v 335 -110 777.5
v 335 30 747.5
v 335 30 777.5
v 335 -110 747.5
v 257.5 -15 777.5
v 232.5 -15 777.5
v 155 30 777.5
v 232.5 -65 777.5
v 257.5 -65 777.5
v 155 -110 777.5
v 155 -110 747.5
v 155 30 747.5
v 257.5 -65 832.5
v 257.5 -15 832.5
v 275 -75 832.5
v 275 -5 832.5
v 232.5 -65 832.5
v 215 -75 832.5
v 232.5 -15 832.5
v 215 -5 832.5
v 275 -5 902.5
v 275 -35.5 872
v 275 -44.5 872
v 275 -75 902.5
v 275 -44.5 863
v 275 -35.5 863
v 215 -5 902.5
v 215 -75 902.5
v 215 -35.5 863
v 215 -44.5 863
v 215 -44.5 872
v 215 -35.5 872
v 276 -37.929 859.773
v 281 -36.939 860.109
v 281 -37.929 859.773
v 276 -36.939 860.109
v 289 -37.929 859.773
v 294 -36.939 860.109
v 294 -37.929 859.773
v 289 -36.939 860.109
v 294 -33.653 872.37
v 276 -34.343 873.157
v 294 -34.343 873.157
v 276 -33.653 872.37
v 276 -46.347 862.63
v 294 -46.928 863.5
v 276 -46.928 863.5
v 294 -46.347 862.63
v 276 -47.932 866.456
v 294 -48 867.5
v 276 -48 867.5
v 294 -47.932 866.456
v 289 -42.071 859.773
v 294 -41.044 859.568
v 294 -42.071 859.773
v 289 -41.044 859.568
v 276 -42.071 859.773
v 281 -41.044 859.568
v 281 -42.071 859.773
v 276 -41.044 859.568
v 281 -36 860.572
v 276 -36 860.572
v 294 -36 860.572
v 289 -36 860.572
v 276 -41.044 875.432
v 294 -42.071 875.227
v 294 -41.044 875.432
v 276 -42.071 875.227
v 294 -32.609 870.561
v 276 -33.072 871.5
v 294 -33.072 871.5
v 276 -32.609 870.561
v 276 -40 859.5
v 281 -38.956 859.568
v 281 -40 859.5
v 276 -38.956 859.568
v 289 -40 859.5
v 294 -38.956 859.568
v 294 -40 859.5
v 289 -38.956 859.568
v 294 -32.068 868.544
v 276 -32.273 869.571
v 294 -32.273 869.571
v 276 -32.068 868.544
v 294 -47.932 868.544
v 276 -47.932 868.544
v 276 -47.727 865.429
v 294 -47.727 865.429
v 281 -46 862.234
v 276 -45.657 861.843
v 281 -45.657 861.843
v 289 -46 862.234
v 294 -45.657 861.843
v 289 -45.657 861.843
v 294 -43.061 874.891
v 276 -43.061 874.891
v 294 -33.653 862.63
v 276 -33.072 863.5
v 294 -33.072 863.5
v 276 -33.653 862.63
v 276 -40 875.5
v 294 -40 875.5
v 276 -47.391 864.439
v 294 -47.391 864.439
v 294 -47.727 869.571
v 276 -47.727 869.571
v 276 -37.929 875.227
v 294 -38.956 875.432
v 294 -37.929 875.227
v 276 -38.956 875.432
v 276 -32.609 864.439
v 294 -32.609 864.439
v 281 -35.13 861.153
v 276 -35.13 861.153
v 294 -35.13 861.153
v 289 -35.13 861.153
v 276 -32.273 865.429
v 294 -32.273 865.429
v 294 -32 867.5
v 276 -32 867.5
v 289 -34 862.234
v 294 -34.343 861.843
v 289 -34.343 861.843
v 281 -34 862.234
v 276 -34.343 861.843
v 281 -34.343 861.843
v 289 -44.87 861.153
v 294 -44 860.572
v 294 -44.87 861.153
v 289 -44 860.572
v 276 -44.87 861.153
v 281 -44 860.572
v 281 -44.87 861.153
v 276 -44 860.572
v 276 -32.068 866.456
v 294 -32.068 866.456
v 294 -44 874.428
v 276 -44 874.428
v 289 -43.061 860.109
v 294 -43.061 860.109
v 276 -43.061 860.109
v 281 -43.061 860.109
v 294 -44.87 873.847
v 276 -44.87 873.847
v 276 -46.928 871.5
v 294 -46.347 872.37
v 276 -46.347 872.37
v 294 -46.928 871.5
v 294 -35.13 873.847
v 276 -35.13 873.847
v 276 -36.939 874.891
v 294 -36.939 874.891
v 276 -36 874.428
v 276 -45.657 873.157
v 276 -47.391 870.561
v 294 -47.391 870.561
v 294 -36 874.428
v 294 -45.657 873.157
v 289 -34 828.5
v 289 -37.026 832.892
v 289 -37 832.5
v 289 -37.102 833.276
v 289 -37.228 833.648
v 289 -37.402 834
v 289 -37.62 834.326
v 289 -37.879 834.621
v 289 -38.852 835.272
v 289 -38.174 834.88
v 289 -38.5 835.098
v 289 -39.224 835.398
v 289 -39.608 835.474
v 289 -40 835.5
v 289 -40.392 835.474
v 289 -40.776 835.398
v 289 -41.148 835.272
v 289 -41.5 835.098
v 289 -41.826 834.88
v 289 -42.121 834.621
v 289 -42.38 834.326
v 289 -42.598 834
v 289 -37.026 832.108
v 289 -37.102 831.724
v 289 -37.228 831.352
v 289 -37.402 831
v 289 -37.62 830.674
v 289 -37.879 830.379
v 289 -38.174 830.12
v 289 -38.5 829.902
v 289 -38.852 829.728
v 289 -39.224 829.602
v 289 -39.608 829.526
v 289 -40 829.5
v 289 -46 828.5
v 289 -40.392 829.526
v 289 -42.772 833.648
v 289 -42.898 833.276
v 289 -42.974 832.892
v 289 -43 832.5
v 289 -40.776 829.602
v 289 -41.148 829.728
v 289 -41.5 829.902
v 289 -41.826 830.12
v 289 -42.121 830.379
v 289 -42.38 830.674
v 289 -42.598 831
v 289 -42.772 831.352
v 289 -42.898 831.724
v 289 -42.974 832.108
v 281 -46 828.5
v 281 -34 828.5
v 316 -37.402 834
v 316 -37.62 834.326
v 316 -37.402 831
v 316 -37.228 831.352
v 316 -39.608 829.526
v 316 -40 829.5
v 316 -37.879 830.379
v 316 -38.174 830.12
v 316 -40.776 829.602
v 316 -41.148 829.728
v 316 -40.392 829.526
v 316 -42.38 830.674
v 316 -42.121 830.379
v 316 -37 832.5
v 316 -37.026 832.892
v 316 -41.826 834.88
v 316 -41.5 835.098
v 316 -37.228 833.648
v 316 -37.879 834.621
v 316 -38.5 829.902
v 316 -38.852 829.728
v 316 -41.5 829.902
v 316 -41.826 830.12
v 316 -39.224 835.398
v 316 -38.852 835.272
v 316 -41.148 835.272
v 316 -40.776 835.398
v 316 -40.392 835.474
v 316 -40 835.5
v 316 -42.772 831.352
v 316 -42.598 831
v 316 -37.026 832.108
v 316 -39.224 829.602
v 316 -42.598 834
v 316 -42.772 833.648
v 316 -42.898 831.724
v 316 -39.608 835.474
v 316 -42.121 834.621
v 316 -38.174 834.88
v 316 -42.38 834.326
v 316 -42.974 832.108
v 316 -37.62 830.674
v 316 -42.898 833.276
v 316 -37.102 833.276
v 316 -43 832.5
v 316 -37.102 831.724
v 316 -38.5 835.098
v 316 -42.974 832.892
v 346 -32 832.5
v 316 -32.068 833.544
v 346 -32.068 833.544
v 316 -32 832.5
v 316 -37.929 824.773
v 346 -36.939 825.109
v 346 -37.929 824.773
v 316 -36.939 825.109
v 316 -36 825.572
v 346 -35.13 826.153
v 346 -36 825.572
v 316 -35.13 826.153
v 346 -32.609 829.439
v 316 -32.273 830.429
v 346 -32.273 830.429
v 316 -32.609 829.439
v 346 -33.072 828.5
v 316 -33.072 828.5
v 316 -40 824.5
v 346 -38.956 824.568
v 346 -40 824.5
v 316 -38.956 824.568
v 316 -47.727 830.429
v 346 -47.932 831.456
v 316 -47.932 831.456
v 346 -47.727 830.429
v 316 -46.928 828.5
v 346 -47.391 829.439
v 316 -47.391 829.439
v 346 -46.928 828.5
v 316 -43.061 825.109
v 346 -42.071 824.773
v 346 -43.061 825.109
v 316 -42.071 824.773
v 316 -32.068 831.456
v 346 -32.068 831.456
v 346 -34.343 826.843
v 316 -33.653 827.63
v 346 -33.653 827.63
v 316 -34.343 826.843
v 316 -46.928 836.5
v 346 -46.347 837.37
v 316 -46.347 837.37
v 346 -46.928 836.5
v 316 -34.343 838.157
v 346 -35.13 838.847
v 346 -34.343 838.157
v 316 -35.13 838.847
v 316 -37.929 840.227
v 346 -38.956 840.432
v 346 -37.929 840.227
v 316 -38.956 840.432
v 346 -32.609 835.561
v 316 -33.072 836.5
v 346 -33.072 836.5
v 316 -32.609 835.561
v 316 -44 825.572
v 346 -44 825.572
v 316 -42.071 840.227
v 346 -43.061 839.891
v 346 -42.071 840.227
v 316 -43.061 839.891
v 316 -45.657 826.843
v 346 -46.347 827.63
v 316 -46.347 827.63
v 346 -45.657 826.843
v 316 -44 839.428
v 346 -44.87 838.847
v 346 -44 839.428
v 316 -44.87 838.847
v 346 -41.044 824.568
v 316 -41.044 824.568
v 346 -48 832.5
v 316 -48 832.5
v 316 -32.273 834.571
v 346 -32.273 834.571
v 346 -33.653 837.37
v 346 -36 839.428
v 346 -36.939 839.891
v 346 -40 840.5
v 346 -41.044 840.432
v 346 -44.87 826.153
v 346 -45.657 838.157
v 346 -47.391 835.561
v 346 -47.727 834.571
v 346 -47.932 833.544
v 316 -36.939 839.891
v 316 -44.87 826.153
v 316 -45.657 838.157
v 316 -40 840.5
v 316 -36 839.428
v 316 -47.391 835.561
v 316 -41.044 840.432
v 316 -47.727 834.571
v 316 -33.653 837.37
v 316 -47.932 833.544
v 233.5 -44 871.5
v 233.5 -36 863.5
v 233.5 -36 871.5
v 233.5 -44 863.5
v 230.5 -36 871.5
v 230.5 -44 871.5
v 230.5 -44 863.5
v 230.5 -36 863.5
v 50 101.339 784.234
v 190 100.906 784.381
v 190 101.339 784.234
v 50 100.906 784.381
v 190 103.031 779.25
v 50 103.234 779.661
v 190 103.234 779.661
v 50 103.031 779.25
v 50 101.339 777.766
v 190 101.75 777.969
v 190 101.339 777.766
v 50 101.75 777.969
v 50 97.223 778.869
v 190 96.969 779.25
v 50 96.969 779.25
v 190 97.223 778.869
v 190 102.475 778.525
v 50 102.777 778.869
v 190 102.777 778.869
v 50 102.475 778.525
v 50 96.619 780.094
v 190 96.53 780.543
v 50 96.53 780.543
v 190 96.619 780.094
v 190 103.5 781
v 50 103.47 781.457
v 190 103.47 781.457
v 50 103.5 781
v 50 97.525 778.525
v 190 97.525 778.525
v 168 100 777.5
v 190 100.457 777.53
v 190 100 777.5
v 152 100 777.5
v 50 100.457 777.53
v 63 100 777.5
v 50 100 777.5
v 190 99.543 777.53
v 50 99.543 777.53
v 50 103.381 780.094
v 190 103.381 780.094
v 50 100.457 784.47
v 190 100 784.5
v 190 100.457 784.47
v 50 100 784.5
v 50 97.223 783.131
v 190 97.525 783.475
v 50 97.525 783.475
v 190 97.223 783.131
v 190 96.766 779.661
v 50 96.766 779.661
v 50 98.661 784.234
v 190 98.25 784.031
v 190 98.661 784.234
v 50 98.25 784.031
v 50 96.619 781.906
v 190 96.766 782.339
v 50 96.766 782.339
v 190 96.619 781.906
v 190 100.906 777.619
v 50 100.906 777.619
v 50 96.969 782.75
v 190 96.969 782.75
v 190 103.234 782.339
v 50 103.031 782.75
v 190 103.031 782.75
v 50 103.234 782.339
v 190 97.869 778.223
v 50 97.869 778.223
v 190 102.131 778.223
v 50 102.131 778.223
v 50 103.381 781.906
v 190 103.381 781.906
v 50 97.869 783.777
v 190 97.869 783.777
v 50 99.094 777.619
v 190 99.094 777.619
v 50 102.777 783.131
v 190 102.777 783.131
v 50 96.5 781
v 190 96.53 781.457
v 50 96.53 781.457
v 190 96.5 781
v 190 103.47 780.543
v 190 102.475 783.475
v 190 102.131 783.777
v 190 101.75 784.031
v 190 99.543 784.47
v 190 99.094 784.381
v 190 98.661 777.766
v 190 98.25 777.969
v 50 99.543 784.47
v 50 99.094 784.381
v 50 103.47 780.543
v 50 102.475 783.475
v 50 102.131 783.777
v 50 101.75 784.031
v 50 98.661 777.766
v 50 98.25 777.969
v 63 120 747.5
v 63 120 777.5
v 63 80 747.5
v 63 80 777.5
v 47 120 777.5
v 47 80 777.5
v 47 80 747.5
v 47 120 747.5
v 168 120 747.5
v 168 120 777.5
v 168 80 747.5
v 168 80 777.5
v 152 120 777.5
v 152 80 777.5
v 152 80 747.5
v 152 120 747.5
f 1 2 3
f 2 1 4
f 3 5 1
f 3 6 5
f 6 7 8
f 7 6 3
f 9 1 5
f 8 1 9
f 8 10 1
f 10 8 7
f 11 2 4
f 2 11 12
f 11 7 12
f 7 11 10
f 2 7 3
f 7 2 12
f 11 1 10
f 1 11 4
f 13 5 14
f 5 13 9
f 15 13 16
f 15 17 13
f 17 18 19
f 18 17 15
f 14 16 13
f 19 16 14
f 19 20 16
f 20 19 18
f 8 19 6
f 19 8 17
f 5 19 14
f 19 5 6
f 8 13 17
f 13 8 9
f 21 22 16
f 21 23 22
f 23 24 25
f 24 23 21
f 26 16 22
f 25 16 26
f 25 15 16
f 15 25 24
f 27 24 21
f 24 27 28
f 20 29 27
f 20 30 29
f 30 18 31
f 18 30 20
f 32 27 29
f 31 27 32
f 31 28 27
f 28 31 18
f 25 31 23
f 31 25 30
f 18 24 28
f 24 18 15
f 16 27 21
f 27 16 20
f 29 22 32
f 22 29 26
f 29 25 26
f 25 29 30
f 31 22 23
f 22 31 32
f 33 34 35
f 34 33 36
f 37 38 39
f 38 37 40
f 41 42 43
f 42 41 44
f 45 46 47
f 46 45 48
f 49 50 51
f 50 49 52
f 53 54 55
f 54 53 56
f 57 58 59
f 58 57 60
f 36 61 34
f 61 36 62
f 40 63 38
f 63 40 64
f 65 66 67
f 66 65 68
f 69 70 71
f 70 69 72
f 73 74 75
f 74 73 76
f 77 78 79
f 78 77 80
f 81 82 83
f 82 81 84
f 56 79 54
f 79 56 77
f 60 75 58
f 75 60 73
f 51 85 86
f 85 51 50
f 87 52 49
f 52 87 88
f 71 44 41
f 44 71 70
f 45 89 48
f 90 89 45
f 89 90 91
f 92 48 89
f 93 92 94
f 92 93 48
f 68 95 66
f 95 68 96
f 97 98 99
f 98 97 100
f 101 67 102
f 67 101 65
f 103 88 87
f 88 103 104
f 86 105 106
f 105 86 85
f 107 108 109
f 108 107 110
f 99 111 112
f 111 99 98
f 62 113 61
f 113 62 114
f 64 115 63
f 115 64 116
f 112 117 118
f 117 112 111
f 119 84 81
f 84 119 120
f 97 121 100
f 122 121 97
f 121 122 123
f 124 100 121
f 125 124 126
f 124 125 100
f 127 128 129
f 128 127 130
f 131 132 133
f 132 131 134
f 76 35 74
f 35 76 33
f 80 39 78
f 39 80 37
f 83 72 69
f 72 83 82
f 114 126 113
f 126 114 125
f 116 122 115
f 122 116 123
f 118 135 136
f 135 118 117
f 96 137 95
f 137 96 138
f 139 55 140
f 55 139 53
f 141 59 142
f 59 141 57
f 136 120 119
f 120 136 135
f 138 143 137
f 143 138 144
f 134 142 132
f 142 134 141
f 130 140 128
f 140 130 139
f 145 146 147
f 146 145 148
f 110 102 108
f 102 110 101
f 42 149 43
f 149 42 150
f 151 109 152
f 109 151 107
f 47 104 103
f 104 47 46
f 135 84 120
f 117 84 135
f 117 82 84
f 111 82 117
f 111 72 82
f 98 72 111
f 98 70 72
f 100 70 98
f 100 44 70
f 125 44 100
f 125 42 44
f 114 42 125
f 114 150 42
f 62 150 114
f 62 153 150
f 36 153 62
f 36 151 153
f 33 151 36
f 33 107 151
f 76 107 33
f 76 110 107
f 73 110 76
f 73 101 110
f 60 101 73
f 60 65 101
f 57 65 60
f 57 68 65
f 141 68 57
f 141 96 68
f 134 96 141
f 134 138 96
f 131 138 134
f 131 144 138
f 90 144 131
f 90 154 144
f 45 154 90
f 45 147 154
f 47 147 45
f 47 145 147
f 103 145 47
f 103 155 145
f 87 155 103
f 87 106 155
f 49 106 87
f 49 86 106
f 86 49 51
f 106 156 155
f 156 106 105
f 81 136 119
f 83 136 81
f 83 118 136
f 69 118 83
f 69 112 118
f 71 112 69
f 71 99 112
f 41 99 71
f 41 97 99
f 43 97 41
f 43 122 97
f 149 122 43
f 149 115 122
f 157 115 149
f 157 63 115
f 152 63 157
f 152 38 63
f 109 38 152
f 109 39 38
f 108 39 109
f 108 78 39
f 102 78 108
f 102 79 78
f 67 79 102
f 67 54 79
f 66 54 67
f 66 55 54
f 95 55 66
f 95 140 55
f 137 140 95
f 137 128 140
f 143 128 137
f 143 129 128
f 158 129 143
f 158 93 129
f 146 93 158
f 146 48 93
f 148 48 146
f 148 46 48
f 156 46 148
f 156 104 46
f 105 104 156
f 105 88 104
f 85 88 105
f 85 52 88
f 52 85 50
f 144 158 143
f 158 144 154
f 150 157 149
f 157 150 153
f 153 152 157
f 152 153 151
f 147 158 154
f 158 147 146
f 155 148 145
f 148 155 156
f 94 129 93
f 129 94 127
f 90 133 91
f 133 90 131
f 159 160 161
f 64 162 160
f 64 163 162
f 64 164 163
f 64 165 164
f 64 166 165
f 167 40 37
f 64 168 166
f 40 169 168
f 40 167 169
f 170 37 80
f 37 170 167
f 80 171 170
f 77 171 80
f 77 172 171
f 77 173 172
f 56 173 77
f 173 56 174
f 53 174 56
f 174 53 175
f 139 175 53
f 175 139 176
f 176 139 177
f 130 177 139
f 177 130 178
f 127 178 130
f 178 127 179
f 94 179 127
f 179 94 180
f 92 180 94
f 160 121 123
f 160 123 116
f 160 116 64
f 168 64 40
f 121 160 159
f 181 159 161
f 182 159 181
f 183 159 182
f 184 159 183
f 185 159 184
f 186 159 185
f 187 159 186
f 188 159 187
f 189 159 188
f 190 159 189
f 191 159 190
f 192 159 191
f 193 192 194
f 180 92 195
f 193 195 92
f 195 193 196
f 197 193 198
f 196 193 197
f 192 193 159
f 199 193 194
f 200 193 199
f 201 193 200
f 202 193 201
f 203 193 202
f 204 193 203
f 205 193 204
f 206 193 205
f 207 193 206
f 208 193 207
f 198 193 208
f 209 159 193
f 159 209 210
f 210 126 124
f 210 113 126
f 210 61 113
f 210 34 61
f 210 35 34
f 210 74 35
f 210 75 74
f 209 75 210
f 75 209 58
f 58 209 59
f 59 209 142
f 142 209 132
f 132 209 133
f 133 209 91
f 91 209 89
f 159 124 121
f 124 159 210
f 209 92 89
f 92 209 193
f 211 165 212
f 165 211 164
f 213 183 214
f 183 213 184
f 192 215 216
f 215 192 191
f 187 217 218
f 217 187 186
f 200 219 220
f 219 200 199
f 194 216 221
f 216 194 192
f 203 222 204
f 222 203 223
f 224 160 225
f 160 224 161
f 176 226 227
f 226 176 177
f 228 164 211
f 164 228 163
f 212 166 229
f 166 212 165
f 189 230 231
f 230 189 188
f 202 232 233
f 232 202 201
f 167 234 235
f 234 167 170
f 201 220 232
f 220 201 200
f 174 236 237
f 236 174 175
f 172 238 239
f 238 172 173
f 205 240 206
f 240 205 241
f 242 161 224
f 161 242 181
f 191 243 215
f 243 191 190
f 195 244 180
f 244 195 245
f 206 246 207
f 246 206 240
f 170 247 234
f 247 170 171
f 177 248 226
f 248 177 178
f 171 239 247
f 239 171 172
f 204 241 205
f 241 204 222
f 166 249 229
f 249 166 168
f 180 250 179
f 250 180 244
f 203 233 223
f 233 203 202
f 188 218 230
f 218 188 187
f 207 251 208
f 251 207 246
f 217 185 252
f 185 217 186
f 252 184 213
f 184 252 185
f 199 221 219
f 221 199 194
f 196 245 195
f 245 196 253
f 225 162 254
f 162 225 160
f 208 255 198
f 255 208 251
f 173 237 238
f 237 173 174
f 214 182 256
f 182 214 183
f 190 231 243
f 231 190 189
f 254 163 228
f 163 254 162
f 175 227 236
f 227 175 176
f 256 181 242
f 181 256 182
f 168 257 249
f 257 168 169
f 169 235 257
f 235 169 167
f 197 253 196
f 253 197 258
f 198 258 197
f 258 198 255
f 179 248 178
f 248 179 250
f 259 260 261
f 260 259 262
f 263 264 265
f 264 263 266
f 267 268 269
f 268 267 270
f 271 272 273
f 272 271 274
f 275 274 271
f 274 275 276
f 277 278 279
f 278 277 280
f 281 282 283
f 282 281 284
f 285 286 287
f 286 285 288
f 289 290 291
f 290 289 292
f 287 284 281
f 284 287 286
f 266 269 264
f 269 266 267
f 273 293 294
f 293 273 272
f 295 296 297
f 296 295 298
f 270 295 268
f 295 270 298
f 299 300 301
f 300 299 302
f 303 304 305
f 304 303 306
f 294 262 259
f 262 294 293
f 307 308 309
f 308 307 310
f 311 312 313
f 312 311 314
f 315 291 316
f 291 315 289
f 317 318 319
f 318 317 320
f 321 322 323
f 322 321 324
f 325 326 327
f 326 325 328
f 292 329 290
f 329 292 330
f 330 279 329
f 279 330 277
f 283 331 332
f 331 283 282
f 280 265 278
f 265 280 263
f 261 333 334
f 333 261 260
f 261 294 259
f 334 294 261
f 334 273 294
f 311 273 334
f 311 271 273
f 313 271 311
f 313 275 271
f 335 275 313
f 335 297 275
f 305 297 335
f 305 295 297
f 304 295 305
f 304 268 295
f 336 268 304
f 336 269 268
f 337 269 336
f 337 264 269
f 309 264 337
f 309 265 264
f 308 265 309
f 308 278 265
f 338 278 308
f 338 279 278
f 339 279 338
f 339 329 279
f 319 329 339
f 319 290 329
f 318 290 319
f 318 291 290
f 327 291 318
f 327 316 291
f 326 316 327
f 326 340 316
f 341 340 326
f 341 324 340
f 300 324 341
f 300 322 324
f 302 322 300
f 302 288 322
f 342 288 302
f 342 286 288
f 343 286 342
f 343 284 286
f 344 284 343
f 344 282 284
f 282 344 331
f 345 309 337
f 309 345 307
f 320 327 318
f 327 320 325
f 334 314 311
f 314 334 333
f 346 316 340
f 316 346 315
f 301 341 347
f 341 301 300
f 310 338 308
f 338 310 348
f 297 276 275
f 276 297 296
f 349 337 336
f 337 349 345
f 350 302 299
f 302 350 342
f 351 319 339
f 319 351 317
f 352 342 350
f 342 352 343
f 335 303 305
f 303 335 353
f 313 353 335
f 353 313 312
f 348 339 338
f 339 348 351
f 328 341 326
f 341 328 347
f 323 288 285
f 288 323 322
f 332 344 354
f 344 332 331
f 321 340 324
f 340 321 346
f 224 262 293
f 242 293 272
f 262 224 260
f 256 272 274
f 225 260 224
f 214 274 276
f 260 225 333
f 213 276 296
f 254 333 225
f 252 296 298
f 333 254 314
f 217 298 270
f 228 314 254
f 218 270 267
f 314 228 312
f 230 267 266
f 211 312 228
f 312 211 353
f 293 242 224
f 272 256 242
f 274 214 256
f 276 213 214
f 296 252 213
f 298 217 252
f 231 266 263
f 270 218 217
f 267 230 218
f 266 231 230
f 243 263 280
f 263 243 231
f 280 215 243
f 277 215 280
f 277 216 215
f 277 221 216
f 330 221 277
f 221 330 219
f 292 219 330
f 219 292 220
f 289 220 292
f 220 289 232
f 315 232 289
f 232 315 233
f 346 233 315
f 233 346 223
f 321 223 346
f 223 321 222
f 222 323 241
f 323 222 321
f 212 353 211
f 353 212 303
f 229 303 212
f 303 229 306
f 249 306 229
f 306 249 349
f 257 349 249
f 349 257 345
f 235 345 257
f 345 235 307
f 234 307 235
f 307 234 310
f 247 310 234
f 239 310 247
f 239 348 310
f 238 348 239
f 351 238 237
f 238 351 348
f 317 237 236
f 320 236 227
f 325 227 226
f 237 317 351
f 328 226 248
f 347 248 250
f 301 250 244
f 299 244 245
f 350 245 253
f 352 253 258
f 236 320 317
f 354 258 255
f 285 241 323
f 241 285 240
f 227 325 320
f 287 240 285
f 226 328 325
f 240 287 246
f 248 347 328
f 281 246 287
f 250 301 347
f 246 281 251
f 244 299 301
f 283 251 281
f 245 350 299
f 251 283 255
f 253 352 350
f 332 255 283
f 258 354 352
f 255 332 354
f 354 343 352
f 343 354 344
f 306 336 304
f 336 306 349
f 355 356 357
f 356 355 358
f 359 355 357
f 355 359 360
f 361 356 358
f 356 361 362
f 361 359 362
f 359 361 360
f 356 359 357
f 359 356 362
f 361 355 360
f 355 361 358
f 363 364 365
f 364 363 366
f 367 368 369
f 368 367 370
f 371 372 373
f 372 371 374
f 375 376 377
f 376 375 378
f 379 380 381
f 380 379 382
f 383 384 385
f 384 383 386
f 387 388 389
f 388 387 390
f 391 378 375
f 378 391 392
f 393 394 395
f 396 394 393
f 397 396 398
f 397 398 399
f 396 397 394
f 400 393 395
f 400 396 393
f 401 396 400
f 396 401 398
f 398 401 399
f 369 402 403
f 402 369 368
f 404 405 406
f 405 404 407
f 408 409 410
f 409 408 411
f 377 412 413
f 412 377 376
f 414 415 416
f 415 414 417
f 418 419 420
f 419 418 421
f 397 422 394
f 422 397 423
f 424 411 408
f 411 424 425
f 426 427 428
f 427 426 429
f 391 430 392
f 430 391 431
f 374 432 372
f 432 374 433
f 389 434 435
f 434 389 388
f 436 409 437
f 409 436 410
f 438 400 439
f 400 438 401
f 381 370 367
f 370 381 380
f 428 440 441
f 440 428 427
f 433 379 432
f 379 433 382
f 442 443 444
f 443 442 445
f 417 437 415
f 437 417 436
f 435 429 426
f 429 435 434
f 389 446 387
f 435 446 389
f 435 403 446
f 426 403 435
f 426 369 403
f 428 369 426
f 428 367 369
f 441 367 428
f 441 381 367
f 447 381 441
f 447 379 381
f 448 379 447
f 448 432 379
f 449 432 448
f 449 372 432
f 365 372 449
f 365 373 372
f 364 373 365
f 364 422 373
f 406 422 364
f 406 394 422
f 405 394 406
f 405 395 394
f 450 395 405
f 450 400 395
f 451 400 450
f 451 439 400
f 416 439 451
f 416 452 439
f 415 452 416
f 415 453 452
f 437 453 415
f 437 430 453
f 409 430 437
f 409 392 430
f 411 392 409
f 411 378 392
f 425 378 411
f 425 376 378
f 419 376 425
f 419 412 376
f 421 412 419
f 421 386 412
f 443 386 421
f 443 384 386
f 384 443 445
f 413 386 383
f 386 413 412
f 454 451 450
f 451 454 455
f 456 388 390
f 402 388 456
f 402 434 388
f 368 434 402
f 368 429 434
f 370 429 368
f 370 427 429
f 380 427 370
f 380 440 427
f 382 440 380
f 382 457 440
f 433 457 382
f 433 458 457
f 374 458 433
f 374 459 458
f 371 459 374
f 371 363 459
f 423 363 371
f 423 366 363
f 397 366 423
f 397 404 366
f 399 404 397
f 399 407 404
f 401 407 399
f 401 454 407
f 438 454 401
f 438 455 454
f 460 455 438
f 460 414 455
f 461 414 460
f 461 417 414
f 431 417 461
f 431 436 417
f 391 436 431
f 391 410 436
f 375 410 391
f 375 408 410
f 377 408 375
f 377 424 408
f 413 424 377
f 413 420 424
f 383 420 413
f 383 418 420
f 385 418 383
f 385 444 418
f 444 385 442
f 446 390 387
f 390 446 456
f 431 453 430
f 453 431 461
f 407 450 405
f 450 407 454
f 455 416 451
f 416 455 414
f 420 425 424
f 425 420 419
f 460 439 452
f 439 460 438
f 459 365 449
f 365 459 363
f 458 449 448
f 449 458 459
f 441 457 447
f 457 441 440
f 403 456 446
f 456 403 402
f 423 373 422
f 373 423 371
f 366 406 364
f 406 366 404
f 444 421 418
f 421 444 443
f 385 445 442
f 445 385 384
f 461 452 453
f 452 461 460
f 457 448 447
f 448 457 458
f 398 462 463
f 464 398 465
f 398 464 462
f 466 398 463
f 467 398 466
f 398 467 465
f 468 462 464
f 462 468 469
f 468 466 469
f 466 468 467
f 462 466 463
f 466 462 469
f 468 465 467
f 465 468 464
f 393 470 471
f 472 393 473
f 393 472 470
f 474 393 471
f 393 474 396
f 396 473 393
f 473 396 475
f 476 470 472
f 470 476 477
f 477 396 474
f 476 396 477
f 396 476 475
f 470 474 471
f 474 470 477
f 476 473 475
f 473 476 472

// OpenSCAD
// Millimetre geometric reference; use real functional tools, not printed heated or cutting equipment.
// Source SHA-256: 97d97832c856c9dcbde0cf4b1b9216d82a9513e5030d10fc58a440a32c2207de
$fn=48;
module stage(){
translate([0, 0, 0]) rotate([0, 0, 0]) cube([180, 140, 30],center=true);
translate([0, 0, 42.5]) rotate([0, 0, 0]) cube([25, 50, 55],center=true);
}
module tool(){
translate([0, -19.75, 0]) rotate([0, 0, 0]) cube([60, 30.5, 70],center=true);
translate([0, 19.75, 0]) rotate([0, 0, 0]) cube([60, 30.5, 70],center=true);
translate([0, 0, -19.75]) rotate([0, 0, 0]) cube([60, 9, 30.5],center=true);
translate([0, 0, 19.75]) rotate([0, 0, 0]) cube([60, 9, 30.5],center=true);
}
module wheel(){
translate([0, 0, 0]) rotate([0, 0, 0]) rotate([0,90,0]) cylinder(r=8,h=18,center=true);
translate([0, 0, -17.5]) rotate([0, 0, 0]) cube([8, 12, 43],center=true);
translate([20, 0, -35]) rotate([0, 0, 0]) rotate([0,90,0]) cylinder(r=3,h=40,center=true);
}
module knob(){
translate([0, 0, 0]) rotate([0, 0, 0]) rotate([0,90,0]) cylinder(r=8,h=30,center=true);
}
module cutter(){
translate([0, 0, 0]) rotate([0, 0, 0]) cube([3, 8, 8],center=true);
}
module pencil(){
translate([0, 0, 0]) rotate([0, 0, 0]) rotate([0,90,0]) cylinder(r=3.5,h=140,center=true);
}
module cradle_left(){
translate([0, 0, 0]) rotate([0, 0, 0]) cube([16, 40, 30],center=true);
}
module cradle_right(){
translate([0, 0, 0]) rotate([0, 0, 0]) cube([16, 40, 30],center=true);
}
translate([245, -40, 762.5]) rotate([0,0,0]) stage();
translate([245, -40, 867.5]) rotate([0,0,0]) tool();
translate([285, -40, 867.5]) rotate([0,0,0]) wheel();
translate([331, -40, 832.5]) rotate([0,0,0]) knob();
translate([232, -40, 867.5]) rotate([0,0,0]) cutter();
translate([120, 100, 781]) rotate([0,0,0]) pencil();
translate([55, 100, 762.5]) rotate([0,0,0]) cradle_left();
translate([160, 100, 762.5]) rotate([0,0,0]) cradle_right();
